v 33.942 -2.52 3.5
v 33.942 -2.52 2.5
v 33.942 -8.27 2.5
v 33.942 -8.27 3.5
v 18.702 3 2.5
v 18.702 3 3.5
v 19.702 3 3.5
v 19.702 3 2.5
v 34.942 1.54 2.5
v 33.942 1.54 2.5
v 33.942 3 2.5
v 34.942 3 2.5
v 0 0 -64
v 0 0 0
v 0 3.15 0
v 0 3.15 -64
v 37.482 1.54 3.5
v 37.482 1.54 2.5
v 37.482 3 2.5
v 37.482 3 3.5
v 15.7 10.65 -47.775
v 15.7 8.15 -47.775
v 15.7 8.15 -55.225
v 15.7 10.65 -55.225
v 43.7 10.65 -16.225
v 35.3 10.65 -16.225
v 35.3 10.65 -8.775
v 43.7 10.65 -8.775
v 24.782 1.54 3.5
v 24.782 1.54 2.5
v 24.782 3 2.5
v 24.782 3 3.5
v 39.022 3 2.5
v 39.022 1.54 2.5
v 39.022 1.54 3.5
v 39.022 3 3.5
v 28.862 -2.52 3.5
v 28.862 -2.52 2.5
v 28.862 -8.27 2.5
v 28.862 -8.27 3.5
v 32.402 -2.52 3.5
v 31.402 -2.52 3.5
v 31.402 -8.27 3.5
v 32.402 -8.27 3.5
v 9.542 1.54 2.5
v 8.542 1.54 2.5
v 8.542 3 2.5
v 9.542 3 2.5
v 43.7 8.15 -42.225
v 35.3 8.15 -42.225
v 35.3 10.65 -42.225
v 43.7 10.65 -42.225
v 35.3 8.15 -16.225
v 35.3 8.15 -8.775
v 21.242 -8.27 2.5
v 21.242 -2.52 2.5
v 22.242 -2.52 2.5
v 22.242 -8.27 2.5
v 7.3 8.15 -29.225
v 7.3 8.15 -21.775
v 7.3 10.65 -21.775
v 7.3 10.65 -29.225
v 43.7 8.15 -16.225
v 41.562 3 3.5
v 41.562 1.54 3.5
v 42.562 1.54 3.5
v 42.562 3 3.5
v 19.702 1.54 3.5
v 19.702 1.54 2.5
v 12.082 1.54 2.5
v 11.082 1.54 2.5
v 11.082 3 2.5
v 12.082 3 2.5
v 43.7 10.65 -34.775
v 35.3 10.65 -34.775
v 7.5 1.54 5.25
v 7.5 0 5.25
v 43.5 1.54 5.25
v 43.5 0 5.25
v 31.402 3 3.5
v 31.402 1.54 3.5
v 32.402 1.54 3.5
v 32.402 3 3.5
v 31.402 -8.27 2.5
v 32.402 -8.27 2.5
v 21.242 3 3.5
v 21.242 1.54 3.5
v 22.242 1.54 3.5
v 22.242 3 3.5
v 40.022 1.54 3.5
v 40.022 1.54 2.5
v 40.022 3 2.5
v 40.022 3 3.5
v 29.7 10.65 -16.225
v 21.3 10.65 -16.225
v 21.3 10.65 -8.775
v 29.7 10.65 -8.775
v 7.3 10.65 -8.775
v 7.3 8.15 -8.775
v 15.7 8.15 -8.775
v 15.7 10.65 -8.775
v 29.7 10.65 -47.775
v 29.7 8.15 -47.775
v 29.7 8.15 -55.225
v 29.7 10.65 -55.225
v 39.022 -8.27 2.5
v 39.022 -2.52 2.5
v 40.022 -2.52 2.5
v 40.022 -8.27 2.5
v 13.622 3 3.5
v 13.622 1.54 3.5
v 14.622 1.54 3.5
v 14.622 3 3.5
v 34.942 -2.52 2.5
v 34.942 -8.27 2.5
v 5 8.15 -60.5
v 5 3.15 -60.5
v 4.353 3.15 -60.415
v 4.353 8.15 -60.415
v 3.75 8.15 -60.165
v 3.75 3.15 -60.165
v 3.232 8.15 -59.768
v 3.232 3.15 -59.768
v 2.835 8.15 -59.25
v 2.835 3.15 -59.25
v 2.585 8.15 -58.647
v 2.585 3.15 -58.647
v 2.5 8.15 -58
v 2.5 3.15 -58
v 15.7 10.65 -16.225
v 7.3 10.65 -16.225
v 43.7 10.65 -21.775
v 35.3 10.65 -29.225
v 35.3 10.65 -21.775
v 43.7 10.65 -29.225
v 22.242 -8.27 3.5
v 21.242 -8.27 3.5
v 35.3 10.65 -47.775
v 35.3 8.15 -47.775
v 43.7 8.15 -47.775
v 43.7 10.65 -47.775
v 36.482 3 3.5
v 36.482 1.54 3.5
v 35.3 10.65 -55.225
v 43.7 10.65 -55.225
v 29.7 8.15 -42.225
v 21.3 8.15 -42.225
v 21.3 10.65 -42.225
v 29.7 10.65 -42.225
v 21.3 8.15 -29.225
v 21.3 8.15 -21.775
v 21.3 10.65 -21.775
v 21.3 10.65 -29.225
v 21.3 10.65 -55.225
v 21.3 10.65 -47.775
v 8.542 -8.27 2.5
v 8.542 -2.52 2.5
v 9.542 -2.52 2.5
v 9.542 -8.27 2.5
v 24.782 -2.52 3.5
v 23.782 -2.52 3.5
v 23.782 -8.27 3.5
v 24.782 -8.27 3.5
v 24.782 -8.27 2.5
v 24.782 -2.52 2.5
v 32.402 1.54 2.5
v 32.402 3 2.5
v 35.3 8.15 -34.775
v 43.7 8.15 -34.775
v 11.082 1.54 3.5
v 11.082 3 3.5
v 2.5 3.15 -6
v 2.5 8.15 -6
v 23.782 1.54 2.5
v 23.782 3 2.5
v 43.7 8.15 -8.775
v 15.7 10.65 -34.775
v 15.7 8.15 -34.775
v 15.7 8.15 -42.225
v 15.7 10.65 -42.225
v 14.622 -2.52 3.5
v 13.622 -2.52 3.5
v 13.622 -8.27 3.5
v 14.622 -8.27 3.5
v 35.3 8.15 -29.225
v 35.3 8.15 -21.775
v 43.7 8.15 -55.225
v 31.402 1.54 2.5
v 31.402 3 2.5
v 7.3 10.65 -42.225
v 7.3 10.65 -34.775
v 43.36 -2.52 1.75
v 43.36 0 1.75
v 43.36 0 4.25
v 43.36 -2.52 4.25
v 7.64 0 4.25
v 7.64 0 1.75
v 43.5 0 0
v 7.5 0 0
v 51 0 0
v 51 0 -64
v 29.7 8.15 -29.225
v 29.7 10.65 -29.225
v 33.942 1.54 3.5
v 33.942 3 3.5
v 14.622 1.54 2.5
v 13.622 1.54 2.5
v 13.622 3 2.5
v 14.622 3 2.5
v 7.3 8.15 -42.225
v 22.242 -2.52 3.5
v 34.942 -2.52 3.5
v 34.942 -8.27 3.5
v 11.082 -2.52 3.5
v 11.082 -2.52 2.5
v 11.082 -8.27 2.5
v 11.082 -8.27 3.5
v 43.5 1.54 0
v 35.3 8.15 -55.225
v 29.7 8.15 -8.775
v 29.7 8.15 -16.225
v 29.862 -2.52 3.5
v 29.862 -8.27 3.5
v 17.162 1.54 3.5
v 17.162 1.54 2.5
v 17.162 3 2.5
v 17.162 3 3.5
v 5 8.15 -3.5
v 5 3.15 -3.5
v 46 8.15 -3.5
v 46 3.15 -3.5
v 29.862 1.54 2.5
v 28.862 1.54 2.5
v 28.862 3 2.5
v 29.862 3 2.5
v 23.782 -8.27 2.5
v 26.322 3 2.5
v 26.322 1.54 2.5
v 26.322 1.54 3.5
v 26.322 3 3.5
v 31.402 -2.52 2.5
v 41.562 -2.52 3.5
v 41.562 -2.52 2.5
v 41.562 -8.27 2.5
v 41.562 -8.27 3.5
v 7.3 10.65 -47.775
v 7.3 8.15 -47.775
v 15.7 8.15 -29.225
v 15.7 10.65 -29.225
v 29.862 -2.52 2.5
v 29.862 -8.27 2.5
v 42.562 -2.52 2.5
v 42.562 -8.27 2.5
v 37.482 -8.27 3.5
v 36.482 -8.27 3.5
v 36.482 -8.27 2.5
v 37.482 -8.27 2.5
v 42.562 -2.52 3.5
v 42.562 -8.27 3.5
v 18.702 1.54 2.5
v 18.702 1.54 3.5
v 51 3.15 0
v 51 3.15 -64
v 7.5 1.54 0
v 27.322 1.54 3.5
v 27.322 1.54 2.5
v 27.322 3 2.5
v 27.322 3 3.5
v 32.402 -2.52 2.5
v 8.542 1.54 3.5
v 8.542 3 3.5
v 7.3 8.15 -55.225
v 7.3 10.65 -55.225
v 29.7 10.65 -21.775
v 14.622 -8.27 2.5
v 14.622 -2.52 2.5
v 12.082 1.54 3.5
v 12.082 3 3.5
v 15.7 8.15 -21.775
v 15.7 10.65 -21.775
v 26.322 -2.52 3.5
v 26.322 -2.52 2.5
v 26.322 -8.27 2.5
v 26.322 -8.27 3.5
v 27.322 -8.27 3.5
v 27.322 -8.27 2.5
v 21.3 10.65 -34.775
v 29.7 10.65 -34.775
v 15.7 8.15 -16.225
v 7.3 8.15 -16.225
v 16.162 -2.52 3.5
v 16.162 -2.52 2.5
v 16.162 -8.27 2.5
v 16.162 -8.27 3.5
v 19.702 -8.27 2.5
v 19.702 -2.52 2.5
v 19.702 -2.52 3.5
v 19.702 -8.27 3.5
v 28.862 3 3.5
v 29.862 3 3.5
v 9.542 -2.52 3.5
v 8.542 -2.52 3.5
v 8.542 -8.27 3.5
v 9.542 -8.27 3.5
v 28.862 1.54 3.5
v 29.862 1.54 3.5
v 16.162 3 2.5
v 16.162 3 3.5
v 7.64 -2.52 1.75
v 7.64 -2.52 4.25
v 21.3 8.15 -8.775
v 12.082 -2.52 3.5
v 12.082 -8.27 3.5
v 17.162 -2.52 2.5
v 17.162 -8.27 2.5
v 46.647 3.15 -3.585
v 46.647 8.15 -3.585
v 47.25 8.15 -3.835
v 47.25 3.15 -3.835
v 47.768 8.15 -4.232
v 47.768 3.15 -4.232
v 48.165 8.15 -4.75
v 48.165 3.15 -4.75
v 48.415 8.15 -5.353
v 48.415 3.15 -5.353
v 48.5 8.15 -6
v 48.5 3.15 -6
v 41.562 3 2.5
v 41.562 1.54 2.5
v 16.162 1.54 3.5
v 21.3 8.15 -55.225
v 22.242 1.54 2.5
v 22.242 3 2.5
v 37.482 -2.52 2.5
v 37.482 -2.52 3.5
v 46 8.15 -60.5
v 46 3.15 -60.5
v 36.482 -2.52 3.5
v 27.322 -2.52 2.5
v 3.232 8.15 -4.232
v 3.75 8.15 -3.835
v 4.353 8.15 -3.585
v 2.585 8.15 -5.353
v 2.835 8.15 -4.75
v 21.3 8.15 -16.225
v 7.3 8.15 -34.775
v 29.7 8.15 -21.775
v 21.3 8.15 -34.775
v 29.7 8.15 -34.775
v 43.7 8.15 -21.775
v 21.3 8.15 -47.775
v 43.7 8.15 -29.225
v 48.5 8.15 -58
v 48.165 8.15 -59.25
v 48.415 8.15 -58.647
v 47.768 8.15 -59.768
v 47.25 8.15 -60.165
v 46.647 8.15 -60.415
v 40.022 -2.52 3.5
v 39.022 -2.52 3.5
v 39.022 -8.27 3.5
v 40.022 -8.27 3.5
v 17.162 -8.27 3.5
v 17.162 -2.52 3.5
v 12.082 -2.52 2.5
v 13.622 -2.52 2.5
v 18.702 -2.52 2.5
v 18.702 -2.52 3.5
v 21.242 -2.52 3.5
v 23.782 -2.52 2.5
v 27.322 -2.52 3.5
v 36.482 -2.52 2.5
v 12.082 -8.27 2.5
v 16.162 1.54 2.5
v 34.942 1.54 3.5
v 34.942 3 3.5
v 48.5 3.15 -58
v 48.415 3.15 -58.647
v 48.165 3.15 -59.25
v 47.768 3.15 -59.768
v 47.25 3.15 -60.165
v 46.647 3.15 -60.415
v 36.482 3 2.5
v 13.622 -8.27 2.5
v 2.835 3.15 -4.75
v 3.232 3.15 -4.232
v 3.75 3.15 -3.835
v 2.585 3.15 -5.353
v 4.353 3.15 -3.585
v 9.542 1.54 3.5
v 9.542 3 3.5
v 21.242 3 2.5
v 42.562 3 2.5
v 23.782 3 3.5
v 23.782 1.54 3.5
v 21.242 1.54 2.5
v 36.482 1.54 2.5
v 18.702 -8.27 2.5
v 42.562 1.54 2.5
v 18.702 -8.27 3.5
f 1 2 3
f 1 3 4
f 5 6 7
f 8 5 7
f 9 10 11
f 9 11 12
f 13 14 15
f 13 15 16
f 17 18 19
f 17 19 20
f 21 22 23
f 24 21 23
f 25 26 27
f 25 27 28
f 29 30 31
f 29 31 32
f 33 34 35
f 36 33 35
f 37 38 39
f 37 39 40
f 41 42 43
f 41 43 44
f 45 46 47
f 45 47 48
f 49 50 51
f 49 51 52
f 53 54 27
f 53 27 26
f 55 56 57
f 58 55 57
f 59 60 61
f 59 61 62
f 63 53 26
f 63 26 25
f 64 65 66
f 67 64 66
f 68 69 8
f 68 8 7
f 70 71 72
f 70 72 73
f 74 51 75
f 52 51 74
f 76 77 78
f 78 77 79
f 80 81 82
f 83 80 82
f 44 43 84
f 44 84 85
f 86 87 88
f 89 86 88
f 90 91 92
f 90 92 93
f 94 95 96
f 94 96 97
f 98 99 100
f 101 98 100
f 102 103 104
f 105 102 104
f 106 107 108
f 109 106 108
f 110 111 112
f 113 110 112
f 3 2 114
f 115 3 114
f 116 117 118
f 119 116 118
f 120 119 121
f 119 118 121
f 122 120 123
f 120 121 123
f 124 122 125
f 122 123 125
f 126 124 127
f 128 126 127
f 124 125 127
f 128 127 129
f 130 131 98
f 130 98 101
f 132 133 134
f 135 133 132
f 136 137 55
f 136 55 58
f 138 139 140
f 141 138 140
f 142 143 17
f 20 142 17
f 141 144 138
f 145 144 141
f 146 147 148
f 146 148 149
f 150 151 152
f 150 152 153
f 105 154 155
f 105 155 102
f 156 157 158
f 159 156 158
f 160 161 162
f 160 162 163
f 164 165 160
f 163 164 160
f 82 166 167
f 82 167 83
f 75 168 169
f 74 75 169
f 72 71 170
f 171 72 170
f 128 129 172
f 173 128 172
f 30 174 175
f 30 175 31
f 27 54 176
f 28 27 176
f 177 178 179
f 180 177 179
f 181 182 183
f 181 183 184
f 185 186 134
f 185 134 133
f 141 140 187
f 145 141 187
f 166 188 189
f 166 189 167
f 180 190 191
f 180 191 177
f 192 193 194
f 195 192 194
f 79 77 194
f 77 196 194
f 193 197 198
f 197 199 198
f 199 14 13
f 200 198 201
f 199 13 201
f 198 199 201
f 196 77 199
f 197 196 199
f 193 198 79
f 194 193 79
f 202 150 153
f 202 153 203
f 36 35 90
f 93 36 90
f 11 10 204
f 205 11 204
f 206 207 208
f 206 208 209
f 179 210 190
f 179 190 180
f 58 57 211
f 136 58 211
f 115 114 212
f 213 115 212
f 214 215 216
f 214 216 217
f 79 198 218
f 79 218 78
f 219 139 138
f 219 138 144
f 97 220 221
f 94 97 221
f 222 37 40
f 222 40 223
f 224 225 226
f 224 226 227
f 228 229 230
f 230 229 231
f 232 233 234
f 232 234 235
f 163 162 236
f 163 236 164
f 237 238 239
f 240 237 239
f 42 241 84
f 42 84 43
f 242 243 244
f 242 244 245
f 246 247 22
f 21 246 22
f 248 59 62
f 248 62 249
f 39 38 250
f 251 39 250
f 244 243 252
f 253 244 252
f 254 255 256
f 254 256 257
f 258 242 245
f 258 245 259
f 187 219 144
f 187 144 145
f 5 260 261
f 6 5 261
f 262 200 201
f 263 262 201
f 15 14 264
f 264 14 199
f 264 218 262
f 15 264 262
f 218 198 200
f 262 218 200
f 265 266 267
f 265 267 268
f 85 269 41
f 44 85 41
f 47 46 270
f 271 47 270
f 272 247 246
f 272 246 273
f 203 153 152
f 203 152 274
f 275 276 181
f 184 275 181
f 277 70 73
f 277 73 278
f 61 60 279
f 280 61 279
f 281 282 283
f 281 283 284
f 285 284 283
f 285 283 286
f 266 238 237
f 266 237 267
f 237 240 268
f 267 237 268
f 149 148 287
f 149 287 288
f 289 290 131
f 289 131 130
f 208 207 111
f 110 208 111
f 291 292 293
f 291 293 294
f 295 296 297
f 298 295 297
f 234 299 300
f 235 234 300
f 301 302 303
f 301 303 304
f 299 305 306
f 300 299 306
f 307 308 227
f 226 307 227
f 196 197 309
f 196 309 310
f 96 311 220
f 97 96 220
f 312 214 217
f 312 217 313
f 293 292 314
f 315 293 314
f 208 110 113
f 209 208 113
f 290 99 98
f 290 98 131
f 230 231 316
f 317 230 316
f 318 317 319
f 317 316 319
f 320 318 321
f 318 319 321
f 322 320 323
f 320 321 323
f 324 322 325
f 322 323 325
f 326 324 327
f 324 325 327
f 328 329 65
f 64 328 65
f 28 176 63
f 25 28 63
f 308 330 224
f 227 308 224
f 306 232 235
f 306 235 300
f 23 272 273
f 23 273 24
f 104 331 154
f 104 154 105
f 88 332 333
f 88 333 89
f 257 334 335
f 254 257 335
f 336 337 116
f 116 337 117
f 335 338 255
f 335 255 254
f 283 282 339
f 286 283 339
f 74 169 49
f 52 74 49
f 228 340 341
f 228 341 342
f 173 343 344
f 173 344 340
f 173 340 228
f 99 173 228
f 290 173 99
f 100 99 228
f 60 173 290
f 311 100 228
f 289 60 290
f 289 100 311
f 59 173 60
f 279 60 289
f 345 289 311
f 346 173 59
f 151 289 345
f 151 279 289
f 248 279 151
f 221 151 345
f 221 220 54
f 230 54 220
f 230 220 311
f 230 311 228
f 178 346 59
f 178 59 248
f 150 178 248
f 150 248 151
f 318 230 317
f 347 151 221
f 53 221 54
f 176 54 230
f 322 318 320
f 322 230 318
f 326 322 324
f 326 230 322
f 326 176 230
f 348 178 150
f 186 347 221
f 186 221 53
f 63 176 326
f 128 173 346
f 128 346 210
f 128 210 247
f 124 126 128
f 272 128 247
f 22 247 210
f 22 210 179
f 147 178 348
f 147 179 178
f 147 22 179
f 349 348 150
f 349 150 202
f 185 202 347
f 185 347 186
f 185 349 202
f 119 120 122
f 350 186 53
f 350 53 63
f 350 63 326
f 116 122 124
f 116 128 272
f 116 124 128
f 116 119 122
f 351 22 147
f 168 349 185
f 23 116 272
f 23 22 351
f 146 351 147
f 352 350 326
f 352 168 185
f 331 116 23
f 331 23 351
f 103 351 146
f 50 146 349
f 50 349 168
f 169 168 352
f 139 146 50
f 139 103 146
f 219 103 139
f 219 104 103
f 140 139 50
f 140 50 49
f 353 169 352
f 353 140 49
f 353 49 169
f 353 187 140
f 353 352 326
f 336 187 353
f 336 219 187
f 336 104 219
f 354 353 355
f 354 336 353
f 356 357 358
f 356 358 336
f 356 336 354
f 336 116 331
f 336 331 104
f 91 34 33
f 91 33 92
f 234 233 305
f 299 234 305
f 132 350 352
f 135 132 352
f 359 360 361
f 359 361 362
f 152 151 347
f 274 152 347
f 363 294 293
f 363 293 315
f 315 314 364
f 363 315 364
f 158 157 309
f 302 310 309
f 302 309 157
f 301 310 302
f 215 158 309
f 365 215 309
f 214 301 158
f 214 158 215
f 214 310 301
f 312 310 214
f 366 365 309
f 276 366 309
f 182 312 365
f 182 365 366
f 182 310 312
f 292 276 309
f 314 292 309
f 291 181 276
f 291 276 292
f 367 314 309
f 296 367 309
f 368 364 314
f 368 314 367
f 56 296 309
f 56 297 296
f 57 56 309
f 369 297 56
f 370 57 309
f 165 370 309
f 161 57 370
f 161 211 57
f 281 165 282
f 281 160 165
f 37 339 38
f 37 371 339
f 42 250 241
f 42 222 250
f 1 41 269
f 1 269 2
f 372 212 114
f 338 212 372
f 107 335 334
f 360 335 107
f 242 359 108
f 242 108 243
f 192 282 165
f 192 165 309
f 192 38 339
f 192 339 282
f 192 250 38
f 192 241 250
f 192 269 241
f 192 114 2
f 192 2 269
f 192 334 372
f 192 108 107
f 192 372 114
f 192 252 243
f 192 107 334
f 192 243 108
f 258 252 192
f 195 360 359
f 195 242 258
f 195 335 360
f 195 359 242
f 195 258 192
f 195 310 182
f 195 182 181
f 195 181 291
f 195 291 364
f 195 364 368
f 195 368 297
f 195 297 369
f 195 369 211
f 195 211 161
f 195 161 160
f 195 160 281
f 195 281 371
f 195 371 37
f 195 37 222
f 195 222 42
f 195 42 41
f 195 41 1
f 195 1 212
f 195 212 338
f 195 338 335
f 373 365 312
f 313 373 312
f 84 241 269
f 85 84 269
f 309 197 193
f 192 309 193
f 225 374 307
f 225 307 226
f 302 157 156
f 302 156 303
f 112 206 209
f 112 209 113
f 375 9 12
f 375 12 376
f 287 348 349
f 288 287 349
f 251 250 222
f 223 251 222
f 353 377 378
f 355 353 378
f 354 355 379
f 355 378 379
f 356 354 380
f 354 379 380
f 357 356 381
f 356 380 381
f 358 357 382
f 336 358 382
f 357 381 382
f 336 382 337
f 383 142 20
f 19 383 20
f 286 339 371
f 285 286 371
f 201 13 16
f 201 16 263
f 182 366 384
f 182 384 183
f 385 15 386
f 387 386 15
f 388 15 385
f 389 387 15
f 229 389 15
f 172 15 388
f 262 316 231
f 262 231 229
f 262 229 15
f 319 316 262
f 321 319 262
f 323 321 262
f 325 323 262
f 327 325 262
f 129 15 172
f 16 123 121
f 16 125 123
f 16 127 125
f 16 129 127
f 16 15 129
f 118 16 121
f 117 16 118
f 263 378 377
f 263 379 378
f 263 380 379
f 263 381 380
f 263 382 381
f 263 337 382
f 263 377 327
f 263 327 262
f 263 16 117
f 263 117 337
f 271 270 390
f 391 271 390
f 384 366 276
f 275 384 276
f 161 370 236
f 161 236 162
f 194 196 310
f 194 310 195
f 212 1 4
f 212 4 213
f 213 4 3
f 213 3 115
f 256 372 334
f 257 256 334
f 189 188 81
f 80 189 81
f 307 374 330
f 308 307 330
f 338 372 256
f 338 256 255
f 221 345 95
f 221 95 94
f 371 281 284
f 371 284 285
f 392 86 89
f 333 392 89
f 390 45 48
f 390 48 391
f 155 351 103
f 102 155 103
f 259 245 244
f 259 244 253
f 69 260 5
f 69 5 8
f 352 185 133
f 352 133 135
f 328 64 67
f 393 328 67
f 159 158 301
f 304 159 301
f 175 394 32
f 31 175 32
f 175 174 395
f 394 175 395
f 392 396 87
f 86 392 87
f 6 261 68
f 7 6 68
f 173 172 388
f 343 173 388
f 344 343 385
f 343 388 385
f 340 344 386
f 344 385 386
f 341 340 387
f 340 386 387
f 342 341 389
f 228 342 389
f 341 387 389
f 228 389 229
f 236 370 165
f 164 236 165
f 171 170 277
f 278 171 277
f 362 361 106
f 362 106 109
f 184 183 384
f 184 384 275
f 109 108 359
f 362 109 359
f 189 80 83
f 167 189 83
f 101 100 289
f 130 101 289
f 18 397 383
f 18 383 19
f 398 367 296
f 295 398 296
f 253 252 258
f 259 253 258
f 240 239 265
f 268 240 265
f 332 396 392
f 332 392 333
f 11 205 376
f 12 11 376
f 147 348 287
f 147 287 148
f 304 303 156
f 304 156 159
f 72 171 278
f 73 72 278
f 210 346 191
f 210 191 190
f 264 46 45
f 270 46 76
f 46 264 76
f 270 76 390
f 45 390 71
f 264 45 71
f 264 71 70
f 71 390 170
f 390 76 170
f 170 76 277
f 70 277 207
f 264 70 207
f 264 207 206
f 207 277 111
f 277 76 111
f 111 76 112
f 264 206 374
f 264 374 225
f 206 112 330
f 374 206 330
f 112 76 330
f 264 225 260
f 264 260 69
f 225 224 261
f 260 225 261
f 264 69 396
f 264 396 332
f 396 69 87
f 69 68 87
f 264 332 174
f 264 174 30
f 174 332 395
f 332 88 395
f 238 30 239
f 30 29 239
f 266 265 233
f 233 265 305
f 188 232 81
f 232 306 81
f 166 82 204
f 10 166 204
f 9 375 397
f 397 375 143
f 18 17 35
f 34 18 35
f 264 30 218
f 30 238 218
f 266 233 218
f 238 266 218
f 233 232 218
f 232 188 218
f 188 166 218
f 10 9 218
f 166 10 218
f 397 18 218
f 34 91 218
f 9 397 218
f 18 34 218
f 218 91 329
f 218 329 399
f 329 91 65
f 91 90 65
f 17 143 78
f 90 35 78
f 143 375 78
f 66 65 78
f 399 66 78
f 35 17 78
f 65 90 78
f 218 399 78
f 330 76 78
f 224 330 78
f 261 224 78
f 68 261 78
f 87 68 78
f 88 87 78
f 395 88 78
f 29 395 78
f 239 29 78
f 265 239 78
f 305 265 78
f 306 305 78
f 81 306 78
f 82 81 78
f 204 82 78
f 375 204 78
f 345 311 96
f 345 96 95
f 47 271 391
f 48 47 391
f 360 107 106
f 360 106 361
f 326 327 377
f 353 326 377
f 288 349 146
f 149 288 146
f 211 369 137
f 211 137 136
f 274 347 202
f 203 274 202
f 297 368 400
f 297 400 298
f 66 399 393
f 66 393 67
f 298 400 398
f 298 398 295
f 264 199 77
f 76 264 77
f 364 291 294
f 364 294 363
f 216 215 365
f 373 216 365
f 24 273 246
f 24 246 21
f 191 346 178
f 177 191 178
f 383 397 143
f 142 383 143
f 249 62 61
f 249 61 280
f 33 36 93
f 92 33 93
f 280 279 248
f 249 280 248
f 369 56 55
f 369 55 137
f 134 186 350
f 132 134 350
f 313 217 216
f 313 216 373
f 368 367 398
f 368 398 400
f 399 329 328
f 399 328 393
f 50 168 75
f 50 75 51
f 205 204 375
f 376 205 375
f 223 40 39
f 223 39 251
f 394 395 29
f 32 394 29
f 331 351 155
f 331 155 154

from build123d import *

# Parameters (mm, degrees)
ESQUISSE1_W             = 51
ESQUISSE1_H             = 64
BOSS_EXTRU_1_DEPTH      = 3.15
BOSS_EXTRU_2_DEPTH      = 5
ESQUISSE3_W             = 8.4
ESQUISSE3_H             = 7.45
BOSS_EXTRU_3_DEPTH      = 2.5
ESQUISSE4_W             = 36
ESQUISSE4_H             = 5.25
BOSS_EXTRU_4_DEPTH      = 1.54
ESQUISSE5_W             = 35.72
ESQUISSE5_H             = 2.5
BOSS_EXTRU_5_DEPTH      = 2.52
ESQUISSE6_W             = 1
ESQUISSE6_H             = 1
BOSS_EXTRU_6_DEPTH      = 5.75
BOSS_EXTRU_6_DEPTH_BACK = 5.52


with BuildPart() as part:
    # Esquisse1 → Boss.-Extru.1 (new body)
    with BuildSketch(Plane(origin=(0, 0, 0), x_dir=(1, 0, 0), z_dir=(0, 1, 0))):
        with Locations((25.5, 32)):
            Rectangle(ESQUISSE1_W, ESQUISSE1_H)
    extrude(amount=BOSS_EXTRU_1_DEPTH)

    # Esquisse2 → Boss.-Extru.2 (add)
    with BuildSketch(Plane(origin=(0, 3.15, 0), x_dir=(1, 0, 0), z_dir=(0, 1, 0))):
        with BuildLine():
            Line((2.5, 58), (2.5, 6))
            ThreePointArc((2.5, 6), (3.232233047, 4.232233047), (5, 3.5))
            Line((5, 3.5), (46, 3.5))
            ThreePointArc((46, 3.5), (47.767766953, 4.232233047), (48.5, 6))
            Line((48.5, 6), (48.5, 58))
            ThreePointArc((48.5, 58), (47.767766953, 59.767766953), (46, 60.5))
            Line((46, 60.5), (5, 60.5))
            ThreePointArc((5, 60.5), (3.232233047, 59.767766953), (2.5, 58))
        make_face()
    extrude(amount=BOSS_EXTRU_2_DEPTH)

    # Esquisse3 → Boss.-Extru.3 (add)
    with BuildSketch(Plane(origin=(0, 8.15, 0), x_dir=(1, 0, 0), z_dir=(0, 1, 0))):
        with Locations((11.5, 38.5)):
            Rectangle(ESQUISSE3_W, ESQUISSE3_H)
        with Locations((11.5, 51.5)):
            Rectangle(ESQUISSE3_W, ESQUISSE3_H)
        with Locations((25.5, 51.5)):
            Rectangle(ESQUISSE3_W, ESQUISSE3_H)
        with Locations((39.5, 51.5)):
            Rectangle(ESQUISSE3_W, ESQUISSE3_H)
        with Locations((25.5, 38.5)):
            Rectangle(ESQUISSE3_W, ESQUISSE3_H)
        with Locations((39.5, 38.5)):
            Rectangle(ESQUISSE3_W, ESQUISSE3_H)
        with Locations((11.5, 12.5)):
            Rectangle(ESQUISSE3_W, ESQUISSE3_H)
        with Locations((11.5, 25.5)):
            Rectangle(ESQUISSE3_W, ESQUISSE3_H)
        with Locations((25.5, 25.5)):
            Rectangle(ESQUISSE3_W, ESQUISSE3_H)
        with Locations((39.5, 25.5)):
            Rectangle(ESQUISSE3_W, ESQUISSE3_H)
        with Locations((25.5, 12.5)):
            Rectangle(ESQUISSE3_W, ESQUISSE3_H)
        with Locations((39.5, 12.5)):
            Rectangle(ESQUISSE3_W, ESQUISSE3_H)
    extrude(amount=BOSS_EXTRU_3_DEPTH)

    # Esquisse4 → Boss.-Extru.4 (add)
    with BuildSketch(Plane.XZ):
        with Locations((25.5, 2.625)):
            Rectangle(ESQUISSE4_W, ESQUISSE4_H)
    extrude(amount=-BOSS_EXTRU_4_DEPTH)

    # Esquisse5 → Boss.-Extru.5 (add)
    with BuildSketch(Plane.XZ):
        with Locations((25.5, 3)):
            Rectangle(ESQUISSE5_W, ESQUISSE5_H)
    extrude(amount=BOSS_EXTRU_5_DEPTH)

    # Esquisse6 → Boss.-Extru.6 (add, two sides)
    with BuildSketch(Plane.XZ.offset(2.52)) as boss_extru_6_sk:
        with Locations((9.041511345, 3)):
            Rectangle(ESQUISSE6_W, ESQUISSE6_H)
        with Locations((11.581511345, 3)):
            Rectangle(ESQUISSE6_W, ESQUISSE6_H)
        with Locations((14.121511345, 3)):
            Rectangle(ESQUISSE6_W, ESQUISSE6_H)
        with Locations((16.661511345, 3)):
            Rectangle(ESQUISSE6_W, ESQUISSE6_H)
        with Locations((19.201511345, 3)):
            Rectangle(ESQUISSE6_W, ESQUISSE6_H)
        with Locations((21.741511345, 3)):
            Rectangle(ESQUISSE6_W, ESQUISSE6_H)
        with Locations((24.281511345, 3)):
            Rectangle(ESQUISSE6_W, ESQUISSE6_H)
        with Locations((26.821511345, 3)):
            Rectangle(ESQUISSE6_W, ESQUISSE6_H)
        with Locations((29.361511345, 3)):
            Rectangle(ESQUISSE6_W, ESQUISSE6_H)
        with Locations((31.901511345, 3)):
            Rectangle(ESQUISSE6_W, ESQUISSE6_H)
        with Locations((34.441511345, 3)):
            Rectangle(ESQUISSE6_W, ESQUISSE6_H)
        with Locations((36.981511345, 3)):
            Rectangle(ESQUISSE6_W, ESQUISSE6_H)
        with Locations((39.521511345, 3)):
            Rectangle(ESQUISSE6_W, ESQUISSE6_H)
        with Locations((42.061511345, 3)):
            Rectangle(ESQUISSE6_W, ESQUISSE6_H)
    extrude(amount=BOSS_EXTRU_6_DEPTH)
    extrude(boss_extru_6_sk.sketch, amount=-BOSS_EXTRU_6_DEPTH_BACK)


solid = part.part
